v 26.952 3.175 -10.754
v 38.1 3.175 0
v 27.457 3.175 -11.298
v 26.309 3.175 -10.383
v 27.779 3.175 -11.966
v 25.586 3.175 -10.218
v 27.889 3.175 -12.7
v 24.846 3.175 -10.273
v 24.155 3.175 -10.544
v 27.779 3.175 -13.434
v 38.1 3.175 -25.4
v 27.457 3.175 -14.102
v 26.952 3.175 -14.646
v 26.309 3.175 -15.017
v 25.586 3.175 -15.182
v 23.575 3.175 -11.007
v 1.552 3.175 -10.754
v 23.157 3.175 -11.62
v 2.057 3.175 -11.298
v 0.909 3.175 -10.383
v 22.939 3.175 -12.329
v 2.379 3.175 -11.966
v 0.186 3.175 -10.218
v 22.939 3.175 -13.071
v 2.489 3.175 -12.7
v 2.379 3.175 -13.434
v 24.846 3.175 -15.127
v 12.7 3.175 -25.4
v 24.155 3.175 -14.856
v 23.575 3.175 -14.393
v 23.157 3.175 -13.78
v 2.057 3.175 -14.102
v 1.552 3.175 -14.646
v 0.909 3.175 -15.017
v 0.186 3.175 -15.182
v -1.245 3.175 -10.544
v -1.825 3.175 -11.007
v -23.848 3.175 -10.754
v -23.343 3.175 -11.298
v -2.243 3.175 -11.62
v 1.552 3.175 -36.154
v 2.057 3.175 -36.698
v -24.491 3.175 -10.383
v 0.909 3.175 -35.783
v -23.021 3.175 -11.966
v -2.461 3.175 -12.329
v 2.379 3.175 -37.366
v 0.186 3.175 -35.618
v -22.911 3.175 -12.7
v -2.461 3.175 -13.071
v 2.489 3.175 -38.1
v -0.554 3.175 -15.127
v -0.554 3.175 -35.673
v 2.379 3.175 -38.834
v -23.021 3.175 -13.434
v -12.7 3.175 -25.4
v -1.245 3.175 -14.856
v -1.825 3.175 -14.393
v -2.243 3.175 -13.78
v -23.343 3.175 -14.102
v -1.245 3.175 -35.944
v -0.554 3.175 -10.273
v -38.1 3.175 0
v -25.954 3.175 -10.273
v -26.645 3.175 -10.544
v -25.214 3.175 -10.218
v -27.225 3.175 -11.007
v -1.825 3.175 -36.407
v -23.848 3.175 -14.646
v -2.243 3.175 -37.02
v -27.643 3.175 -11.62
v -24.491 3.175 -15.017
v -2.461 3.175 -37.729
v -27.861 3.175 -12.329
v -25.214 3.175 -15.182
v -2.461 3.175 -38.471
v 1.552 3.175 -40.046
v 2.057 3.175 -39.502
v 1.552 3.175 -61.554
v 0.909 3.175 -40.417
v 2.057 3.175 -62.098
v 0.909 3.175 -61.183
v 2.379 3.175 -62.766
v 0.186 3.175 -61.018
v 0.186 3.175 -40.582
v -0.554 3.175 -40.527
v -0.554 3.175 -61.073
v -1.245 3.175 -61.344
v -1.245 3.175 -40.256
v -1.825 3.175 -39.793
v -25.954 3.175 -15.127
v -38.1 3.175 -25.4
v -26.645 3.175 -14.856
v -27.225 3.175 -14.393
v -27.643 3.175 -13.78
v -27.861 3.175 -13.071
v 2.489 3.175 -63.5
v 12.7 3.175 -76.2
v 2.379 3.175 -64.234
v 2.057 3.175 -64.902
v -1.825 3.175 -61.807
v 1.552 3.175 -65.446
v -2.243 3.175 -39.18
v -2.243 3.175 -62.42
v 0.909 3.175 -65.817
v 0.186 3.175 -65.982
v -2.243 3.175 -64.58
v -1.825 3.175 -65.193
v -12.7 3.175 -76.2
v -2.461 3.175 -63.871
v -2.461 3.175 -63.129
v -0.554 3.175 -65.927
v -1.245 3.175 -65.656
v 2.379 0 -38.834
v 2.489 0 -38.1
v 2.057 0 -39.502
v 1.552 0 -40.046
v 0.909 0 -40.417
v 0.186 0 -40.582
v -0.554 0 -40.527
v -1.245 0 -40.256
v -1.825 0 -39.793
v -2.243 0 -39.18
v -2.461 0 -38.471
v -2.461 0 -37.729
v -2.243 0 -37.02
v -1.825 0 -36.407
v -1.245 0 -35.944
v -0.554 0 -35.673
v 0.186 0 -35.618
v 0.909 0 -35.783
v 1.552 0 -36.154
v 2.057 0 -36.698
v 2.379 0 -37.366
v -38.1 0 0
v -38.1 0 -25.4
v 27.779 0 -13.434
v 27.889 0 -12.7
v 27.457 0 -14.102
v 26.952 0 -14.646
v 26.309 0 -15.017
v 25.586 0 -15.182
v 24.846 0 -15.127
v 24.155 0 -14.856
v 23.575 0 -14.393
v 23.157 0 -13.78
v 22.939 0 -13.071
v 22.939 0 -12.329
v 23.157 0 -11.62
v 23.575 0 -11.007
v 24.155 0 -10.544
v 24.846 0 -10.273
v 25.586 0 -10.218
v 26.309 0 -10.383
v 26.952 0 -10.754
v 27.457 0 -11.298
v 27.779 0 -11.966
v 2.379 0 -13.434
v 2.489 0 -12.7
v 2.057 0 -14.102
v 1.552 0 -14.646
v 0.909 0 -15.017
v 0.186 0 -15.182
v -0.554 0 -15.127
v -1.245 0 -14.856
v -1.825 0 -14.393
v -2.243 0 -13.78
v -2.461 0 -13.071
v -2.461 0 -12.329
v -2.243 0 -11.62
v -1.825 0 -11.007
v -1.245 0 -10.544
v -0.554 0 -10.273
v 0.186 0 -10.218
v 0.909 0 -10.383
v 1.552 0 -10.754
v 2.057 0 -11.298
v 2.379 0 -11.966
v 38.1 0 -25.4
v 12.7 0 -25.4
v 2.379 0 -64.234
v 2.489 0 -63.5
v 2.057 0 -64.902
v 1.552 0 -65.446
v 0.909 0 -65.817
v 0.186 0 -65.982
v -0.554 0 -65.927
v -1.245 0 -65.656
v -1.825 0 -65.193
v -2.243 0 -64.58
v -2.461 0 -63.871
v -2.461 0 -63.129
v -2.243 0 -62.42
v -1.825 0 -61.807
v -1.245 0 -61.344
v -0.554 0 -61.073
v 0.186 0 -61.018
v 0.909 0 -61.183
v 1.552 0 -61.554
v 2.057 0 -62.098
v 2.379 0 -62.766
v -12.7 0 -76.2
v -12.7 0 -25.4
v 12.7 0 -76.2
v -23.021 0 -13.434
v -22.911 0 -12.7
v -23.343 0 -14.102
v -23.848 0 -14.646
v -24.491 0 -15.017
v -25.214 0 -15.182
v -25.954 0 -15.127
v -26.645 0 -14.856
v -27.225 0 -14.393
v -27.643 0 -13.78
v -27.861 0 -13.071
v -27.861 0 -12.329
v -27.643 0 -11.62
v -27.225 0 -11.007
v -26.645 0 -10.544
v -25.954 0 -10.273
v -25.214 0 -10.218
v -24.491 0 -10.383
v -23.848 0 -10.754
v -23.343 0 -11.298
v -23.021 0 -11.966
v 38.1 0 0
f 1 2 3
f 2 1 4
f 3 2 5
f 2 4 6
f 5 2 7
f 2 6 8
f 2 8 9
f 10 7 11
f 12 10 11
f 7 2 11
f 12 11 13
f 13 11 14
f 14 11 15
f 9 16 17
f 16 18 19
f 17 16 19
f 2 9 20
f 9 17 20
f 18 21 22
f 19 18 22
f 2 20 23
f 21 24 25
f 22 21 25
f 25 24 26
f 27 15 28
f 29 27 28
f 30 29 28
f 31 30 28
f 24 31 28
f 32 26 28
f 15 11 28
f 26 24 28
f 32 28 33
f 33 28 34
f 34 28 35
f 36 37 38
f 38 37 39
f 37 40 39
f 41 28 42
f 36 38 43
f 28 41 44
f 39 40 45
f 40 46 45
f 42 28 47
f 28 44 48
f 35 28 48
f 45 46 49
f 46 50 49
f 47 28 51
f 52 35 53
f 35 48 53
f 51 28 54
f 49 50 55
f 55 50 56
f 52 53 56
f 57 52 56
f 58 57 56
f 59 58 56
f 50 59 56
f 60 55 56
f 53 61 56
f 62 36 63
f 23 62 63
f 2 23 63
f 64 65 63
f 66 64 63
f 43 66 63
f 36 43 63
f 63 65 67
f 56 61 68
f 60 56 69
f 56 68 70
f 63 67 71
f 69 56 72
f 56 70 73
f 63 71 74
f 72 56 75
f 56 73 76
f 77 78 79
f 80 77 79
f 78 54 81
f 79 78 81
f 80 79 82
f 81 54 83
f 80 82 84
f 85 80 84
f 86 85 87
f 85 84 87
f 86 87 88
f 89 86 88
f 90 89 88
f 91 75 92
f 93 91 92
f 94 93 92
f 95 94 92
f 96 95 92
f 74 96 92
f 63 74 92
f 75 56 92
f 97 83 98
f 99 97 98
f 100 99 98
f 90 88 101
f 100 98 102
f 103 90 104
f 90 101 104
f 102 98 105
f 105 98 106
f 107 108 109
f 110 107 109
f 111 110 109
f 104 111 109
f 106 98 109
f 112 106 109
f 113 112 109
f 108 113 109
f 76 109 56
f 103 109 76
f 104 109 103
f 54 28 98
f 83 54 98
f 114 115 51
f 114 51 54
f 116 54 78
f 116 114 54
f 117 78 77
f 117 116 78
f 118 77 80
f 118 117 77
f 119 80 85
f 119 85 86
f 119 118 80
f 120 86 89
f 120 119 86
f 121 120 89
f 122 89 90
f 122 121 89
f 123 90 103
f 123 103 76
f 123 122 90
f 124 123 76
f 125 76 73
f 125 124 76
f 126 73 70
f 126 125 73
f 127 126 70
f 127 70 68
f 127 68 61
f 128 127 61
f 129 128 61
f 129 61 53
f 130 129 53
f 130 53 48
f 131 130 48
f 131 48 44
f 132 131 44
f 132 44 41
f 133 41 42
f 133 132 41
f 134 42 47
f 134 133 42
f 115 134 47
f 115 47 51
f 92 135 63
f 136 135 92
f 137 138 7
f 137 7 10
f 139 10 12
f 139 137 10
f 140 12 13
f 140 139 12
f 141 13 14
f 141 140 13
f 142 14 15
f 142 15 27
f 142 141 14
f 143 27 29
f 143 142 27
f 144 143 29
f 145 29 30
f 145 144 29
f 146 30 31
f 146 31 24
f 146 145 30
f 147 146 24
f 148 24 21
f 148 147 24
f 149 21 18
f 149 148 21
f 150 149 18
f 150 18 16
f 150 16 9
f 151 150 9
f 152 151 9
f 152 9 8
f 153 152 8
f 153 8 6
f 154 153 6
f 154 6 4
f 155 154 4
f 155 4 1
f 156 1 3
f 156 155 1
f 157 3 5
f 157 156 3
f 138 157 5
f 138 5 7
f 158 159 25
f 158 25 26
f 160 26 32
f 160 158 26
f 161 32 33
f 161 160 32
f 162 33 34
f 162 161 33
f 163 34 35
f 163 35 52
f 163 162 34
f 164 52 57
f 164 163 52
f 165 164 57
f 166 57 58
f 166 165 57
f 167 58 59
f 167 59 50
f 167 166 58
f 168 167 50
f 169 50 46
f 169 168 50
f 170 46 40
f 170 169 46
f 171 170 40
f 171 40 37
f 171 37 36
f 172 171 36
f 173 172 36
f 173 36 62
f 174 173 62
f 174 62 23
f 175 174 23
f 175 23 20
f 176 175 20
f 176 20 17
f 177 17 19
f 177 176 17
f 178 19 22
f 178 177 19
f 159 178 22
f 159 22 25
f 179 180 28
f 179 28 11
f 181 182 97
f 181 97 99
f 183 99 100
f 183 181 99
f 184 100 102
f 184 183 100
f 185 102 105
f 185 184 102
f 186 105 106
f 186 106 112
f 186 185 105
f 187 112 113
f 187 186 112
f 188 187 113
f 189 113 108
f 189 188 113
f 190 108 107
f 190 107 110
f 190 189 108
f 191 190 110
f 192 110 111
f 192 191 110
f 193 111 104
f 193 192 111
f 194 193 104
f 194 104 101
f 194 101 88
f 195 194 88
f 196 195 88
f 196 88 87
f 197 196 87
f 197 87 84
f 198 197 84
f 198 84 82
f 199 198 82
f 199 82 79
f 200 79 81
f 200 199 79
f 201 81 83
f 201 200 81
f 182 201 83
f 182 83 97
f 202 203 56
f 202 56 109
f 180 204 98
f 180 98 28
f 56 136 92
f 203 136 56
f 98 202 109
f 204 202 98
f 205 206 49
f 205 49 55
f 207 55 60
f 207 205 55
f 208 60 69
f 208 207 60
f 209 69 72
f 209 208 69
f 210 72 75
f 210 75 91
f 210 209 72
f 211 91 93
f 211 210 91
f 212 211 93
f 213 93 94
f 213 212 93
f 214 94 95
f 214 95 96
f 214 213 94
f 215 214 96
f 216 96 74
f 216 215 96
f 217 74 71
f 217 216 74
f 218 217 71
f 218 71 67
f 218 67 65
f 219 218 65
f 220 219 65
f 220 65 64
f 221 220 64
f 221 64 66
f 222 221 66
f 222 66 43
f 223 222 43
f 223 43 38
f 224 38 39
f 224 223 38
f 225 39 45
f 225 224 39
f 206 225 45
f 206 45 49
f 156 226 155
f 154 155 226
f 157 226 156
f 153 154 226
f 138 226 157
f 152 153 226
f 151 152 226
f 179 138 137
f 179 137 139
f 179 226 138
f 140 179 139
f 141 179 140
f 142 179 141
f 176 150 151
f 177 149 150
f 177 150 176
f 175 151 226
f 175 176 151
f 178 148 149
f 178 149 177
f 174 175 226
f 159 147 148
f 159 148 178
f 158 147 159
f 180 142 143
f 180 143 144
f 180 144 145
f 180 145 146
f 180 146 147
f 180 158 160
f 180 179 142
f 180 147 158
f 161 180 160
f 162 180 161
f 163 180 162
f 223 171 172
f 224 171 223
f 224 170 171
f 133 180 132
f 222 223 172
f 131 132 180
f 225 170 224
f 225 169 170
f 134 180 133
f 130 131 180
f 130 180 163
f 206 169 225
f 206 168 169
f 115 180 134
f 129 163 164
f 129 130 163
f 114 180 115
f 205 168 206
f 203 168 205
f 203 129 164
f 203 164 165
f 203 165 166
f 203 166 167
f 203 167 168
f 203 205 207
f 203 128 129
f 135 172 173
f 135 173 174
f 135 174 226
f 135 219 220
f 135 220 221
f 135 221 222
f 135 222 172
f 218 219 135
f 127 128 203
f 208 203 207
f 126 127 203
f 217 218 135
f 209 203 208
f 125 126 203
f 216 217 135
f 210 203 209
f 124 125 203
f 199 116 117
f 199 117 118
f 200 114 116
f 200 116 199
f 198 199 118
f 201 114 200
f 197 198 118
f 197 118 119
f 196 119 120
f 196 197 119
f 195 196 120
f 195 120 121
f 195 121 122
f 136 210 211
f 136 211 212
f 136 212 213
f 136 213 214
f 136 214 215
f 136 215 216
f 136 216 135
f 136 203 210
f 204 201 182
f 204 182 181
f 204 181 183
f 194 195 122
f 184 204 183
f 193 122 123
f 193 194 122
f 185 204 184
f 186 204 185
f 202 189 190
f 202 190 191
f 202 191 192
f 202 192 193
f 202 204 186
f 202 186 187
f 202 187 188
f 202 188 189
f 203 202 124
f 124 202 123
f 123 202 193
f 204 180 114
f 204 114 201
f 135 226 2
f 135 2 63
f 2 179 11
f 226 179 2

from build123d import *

# Parameters (mm, degrees)
SKETCH1_R           = 2.4892
BOSS_EXTRUDE1_DEPTH = 3.175


with BuildPart() as part:
    # Sketch1 → Boss-Extrude1 (new body)
    with BuildSketch(Plane(origin=(0, 0, 0), x_dir=(1, 0, 0), z_dir=(0, 1, 0))):
        Polygon((38.1, 0), (-38.1, 0), (-38.1, 25.4), (-12.7, 25.4), (-12.7, 76.2), (12.7, 76.2), (12.7, 25.4), (38.1, 25.4), align=None)
        with Locations((0, 63.5)):
            Circle(SKETCH1_R, mode=Mode.SUBTRACT)
        with Locations((0, 38.1)):
            Circle(SKETCH1_R, mode=Mode.SUBTRACT)
        with Locations((-25.4, 12.7)):
            Circle(SKETCH1_R, mode=Mode.SUBTRACT)
        with Locations((25.4, 12.7)):
            Circle(SKETCH1_R, mode=Mode.SUBTRACT)
        with Locations((0, 12.7)):
            Circle(SKETCH1_R, mode=Mode.SUBTRACT)
    extrude(amount=BOSS_EXTRUDE1_DEPTH)


solid = part.part
